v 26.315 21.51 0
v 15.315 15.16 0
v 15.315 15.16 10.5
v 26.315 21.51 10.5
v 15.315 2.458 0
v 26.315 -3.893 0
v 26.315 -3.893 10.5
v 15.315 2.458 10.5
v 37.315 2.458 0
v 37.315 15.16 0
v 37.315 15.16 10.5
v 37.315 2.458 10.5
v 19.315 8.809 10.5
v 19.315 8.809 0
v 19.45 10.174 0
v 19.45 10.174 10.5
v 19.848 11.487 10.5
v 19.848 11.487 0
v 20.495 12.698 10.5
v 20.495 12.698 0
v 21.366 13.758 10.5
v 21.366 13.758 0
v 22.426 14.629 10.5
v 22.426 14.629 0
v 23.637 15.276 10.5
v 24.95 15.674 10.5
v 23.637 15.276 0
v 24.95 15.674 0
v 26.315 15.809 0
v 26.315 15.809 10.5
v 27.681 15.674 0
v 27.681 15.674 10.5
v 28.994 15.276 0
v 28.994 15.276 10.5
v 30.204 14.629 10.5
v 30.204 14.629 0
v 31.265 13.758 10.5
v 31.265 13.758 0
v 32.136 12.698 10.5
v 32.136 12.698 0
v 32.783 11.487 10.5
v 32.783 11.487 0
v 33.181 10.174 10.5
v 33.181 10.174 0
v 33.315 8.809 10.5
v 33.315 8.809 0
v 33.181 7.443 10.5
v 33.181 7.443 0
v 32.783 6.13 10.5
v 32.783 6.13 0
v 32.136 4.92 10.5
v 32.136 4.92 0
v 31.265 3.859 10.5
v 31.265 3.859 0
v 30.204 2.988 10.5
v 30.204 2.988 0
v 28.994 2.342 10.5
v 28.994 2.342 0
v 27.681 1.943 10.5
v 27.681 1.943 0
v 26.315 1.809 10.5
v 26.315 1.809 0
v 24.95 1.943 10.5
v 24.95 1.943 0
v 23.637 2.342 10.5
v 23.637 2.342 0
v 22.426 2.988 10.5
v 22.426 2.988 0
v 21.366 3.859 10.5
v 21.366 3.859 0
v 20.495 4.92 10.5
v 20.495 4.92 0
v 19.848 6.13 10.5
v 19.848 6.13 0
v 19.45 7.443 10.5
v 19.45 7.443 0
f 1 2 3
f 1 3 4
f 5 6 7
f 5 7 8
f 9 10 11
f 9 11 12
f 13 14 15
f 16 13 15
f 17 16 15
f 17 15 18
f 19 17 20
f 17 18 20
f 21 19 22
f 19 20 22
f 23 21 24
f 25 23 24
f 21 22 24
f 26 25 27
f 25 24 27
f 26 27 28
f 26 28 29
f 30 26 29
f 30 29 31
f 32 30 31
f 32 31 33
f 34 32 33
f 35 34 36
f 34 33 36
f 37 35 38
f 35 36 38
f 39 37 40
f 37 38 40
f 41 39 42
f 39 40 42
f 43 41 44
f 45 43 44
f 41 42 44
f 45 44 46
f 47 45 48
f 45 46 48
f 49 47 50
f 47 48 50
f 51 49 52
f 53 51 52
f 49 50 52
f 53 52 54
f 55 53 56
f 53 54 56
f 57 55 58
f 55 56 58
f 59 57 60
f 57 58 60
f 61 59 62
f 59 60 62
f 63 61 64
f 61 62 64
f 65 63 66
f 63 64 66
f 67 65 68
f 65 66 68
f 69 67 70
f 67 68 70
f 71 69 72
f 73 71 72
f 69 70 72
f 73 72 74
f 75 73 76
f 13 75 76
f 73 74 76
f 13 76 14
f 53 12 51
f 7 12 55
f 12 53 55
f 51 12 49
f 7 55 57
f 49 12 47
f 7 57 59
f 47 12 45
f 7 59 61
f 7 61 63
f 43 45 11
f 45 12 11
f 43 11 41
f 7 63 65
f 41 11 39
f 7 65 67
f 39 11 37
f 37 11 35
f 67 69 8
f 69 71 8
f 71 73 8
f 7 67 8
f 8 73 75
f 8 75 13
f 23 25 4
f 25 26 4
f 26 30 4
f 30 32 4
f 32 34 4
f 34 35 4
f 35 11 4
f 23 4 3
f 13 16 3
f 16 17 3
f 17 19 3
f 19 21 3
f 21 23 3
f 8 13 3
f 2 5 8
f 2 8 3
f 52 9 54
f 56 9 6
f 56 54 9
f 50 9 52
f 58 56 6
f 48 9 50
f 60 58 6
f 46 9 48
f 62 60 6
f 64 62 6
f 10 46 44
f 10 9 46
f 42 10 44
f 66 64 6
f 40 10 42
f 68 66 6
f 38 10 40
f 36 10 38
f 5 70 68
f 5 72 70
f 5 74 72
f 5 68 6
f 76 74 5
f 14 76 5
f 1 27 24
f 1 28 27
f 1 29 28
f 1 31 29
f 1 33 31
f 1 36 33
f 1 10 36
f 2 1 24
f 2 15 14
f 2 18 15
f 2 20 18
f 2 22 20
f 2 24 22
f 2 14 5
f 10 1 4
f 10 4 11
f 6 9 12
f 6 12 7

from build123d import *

# Parameters (mm, degrees)
EXTRUDE_1_DEPTH     = 10.5
SKETCH_2_R          = 7
CUT_EXTRUDE_1_DEPTH = 10.5


with BuildPart() as part:
    # 草图1 → 凸台-拉伸1 (new body)
    with BuildSketch(Plane.XY):
        Polygon((37.315481106, 15.159530396), (37.315481106, 2.457824474), (26.315481106, -3.893028487), (15.315481106, 2.457824474), (15.315481106, 15.159530396), (26.315481106, 21.510383357), align=None)
    extrude(amount=EXTRUDE_1_DEPTH)

    # 草图2 → 切除-拉伸1 (cut)
    with BuildSketch(Plane(origin=(0, 0, 0), x_dir=(-1, 0, 0), z_dir=(0, 0, -1))):
        with Locations((-26.315481106, 8.808677435)):
            Circle(SKETCH_2_R)
    extrude(amount=-CUT_EXTRUDE_1_DEPTH, mode=Mode.SUBTRACT)


solid = part.part
